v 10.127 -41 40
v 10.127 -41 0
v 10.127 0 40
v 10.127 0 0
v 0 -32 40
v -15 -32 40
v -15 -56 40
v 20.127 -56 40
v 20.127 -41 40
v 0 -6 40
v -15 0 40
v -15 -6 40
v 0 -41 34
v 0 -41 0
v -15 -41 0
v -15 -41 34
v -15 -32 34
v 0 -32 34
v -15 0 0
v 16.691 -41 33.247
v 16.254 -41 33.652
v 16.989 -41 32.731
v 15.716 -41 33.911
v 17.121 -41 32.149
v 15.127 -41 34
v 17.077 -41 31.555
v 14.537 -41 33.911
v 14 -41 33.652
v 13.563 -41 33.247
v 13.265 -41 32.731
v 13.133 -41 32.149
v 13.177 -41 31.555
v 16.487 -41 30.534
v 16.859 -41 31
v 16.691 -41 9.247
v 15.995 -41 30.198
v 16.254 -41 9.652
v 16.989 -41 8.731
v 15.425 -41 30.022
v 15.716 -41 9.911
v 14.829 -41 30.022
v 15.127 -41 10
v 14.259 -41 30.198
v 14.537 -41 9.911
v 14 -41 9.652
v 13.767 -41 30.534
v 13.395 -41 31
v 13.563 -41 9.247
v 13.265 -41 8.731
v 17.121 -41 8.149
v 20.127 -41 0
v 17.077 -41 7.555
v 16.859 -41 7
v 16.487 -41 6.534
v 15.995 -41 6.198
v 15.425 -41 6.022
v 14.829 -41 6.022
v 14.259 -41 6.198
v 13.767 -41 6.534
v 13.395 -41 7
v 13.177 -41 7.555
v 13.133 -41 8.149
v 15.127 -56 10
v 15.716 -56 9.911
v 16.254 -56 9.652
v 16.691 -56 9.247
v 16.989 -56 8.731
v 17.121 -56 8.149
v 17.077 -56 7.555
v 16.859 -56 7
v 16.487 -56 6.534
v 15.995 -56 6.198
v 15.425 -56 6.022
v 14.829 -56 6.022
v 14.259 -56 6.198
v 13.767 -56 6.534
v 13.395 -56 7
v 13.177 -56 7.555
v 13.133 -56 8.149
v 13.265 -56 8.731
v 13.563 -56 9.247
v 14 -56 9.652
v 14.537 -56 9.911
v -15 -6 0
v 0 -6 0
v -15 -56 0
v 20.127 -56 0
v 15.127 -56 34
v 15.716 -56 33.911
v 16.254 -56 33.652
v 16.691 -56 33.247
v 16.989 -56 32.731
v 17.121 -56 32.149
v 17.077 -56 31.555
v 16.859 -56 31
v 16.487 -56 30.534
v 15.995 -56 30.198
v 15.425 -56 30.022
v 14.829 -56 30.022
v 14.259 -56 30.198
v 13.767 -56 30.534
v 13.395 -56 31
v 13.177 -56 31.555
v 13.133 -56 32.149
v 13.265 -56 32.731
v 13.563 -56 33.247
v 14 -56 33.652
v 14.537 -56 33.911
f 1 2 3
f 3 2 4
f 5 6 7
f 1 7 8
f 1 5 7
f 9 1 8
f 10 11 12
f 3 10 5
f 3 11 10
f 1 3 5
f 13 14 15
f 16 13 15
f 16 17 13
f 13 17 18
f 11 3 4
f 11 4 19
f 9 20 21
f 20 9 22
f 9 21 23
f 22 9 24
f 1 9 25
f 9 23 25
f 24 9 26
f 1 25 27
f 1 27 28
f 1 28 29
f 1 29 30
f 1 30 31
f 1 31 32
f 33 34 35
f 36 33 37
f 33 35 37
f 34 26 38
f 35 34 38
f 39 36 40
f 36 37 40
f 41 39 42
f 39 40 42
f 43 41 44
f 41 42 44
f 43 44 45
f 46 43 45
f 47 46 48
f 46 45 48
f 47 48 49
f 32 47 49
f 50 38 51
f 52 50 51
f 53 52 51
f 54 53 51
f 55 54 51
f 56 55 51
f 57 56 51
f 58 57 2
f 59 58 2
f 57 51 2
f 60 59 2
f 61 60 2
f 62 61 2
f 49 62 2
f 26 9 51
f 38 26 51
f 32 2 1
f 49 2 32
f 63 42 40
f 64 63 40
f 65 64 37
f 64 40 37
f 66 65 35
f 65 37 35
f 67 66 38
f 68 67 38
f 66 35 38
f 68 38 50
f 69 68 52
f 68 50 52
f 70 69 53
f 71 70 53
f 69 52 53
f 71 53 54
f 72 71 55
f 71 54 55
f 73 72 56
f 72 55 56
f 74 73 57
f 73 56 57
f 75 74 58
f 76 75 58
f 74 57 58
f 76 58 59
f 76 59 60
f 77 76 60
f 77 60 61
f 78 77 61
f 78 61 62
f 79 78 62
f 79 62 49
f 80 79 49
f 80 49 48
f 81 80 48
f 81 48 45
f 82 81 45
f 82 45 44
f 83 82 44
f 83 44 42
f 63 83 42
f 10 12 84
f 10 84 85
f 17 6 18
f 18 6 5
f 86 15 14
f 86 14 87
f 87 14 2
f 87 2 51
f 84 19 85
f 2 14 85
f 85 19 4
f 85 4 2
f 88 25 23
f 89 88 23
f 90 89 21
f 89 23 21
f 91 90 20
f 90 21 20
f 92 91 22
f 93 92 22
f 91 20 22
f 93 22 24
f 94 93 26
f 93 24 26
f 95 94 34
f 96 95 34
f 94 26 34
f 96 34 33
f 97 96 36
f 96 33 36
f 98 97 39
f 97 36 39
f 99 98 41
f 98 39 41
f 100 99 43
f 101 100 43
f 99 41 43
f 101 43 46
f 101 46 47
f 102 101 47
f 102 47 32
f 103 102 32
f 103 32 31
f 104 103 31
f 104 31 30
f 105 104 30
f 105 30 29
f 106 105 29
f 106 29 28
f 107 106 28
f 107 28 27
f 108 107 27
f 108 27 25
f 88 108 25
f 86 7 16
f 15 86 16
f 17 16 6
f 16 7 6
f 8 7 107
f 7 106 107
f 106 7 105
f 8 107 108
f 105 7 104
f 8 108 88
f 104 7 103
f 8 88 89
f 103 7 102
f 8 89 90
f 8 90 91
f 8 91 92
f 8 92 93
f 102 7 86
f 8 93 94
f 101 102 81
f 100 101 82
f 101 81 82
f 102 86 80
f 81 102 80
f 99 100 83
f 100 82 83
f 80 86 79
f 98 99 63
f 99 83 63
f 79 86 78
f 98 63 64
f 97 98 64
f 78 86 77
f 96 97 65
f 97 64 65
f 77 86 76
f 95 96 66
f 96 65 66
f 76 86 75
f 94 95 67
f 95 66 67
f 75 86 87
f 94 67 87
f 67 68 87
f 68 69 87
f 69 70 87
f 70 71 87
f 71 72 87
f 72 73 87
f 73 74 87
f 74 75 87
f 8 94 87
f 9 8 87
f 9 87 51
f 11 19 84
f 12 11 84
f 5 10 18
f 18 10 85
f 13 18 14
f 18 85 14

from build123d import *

# Parameters (mm, degrees)
BOSS_EXTRU_1_DEPTH  = 40
SKETCH1_R           = 2
CUT_EXTRUDE1_DEPTH  = 29
SKETCH2_W           = 15
SKETCH2_H           = 9
BOSS_EXTRUDE1_DEPTH = 6


with BuildPart() as part:
    # Esquisse1 → Boss.-Extru.1 (new body)
    with BuildSketch(Plane.XY):
        Polygon((0, 0), (-15, 0), (-15, -6), (0, -6), (0, -41), (-15, -41), (-15, -56), (20.126965986, -56), (20.126965986, -41), (10.126965986, -41), (10.126965986, 0), align=None)
    extrude(amount=BOSS_EXTRU_1_DEPTH)

    # Sketch1 → Cut-Extrude1 (cut)
    with BuildSketch(Plane(origin=(0, -41, 0), x_dir=(1, 0, 0), z_dir=(0, 1, 0))):
        with Locations(Location((15.126965986, -8, 0), (0, 0, 270))):
            Circle(SKETCH1_R)
        with Locations(Location((15.126965986, -32, 0), (0, 0, 270))):
            Circle(SKETCH1_R)
    extrude(amount=-CUT_EXTRUDE1_DEPTH, mode=Mode.SUBTRACT)

    # Sketch2 → Boss-Extrude1 (add)
    with BuildSketch(Plane.XY.offset(40)):
        with Locations((-7.5, -36.5)):
            Rectangle(SKETCH2_W, SKETCH2_H)
    extrude(amount=-BOSS_EXTRUDE1_DEPTH)


solid = part.part
